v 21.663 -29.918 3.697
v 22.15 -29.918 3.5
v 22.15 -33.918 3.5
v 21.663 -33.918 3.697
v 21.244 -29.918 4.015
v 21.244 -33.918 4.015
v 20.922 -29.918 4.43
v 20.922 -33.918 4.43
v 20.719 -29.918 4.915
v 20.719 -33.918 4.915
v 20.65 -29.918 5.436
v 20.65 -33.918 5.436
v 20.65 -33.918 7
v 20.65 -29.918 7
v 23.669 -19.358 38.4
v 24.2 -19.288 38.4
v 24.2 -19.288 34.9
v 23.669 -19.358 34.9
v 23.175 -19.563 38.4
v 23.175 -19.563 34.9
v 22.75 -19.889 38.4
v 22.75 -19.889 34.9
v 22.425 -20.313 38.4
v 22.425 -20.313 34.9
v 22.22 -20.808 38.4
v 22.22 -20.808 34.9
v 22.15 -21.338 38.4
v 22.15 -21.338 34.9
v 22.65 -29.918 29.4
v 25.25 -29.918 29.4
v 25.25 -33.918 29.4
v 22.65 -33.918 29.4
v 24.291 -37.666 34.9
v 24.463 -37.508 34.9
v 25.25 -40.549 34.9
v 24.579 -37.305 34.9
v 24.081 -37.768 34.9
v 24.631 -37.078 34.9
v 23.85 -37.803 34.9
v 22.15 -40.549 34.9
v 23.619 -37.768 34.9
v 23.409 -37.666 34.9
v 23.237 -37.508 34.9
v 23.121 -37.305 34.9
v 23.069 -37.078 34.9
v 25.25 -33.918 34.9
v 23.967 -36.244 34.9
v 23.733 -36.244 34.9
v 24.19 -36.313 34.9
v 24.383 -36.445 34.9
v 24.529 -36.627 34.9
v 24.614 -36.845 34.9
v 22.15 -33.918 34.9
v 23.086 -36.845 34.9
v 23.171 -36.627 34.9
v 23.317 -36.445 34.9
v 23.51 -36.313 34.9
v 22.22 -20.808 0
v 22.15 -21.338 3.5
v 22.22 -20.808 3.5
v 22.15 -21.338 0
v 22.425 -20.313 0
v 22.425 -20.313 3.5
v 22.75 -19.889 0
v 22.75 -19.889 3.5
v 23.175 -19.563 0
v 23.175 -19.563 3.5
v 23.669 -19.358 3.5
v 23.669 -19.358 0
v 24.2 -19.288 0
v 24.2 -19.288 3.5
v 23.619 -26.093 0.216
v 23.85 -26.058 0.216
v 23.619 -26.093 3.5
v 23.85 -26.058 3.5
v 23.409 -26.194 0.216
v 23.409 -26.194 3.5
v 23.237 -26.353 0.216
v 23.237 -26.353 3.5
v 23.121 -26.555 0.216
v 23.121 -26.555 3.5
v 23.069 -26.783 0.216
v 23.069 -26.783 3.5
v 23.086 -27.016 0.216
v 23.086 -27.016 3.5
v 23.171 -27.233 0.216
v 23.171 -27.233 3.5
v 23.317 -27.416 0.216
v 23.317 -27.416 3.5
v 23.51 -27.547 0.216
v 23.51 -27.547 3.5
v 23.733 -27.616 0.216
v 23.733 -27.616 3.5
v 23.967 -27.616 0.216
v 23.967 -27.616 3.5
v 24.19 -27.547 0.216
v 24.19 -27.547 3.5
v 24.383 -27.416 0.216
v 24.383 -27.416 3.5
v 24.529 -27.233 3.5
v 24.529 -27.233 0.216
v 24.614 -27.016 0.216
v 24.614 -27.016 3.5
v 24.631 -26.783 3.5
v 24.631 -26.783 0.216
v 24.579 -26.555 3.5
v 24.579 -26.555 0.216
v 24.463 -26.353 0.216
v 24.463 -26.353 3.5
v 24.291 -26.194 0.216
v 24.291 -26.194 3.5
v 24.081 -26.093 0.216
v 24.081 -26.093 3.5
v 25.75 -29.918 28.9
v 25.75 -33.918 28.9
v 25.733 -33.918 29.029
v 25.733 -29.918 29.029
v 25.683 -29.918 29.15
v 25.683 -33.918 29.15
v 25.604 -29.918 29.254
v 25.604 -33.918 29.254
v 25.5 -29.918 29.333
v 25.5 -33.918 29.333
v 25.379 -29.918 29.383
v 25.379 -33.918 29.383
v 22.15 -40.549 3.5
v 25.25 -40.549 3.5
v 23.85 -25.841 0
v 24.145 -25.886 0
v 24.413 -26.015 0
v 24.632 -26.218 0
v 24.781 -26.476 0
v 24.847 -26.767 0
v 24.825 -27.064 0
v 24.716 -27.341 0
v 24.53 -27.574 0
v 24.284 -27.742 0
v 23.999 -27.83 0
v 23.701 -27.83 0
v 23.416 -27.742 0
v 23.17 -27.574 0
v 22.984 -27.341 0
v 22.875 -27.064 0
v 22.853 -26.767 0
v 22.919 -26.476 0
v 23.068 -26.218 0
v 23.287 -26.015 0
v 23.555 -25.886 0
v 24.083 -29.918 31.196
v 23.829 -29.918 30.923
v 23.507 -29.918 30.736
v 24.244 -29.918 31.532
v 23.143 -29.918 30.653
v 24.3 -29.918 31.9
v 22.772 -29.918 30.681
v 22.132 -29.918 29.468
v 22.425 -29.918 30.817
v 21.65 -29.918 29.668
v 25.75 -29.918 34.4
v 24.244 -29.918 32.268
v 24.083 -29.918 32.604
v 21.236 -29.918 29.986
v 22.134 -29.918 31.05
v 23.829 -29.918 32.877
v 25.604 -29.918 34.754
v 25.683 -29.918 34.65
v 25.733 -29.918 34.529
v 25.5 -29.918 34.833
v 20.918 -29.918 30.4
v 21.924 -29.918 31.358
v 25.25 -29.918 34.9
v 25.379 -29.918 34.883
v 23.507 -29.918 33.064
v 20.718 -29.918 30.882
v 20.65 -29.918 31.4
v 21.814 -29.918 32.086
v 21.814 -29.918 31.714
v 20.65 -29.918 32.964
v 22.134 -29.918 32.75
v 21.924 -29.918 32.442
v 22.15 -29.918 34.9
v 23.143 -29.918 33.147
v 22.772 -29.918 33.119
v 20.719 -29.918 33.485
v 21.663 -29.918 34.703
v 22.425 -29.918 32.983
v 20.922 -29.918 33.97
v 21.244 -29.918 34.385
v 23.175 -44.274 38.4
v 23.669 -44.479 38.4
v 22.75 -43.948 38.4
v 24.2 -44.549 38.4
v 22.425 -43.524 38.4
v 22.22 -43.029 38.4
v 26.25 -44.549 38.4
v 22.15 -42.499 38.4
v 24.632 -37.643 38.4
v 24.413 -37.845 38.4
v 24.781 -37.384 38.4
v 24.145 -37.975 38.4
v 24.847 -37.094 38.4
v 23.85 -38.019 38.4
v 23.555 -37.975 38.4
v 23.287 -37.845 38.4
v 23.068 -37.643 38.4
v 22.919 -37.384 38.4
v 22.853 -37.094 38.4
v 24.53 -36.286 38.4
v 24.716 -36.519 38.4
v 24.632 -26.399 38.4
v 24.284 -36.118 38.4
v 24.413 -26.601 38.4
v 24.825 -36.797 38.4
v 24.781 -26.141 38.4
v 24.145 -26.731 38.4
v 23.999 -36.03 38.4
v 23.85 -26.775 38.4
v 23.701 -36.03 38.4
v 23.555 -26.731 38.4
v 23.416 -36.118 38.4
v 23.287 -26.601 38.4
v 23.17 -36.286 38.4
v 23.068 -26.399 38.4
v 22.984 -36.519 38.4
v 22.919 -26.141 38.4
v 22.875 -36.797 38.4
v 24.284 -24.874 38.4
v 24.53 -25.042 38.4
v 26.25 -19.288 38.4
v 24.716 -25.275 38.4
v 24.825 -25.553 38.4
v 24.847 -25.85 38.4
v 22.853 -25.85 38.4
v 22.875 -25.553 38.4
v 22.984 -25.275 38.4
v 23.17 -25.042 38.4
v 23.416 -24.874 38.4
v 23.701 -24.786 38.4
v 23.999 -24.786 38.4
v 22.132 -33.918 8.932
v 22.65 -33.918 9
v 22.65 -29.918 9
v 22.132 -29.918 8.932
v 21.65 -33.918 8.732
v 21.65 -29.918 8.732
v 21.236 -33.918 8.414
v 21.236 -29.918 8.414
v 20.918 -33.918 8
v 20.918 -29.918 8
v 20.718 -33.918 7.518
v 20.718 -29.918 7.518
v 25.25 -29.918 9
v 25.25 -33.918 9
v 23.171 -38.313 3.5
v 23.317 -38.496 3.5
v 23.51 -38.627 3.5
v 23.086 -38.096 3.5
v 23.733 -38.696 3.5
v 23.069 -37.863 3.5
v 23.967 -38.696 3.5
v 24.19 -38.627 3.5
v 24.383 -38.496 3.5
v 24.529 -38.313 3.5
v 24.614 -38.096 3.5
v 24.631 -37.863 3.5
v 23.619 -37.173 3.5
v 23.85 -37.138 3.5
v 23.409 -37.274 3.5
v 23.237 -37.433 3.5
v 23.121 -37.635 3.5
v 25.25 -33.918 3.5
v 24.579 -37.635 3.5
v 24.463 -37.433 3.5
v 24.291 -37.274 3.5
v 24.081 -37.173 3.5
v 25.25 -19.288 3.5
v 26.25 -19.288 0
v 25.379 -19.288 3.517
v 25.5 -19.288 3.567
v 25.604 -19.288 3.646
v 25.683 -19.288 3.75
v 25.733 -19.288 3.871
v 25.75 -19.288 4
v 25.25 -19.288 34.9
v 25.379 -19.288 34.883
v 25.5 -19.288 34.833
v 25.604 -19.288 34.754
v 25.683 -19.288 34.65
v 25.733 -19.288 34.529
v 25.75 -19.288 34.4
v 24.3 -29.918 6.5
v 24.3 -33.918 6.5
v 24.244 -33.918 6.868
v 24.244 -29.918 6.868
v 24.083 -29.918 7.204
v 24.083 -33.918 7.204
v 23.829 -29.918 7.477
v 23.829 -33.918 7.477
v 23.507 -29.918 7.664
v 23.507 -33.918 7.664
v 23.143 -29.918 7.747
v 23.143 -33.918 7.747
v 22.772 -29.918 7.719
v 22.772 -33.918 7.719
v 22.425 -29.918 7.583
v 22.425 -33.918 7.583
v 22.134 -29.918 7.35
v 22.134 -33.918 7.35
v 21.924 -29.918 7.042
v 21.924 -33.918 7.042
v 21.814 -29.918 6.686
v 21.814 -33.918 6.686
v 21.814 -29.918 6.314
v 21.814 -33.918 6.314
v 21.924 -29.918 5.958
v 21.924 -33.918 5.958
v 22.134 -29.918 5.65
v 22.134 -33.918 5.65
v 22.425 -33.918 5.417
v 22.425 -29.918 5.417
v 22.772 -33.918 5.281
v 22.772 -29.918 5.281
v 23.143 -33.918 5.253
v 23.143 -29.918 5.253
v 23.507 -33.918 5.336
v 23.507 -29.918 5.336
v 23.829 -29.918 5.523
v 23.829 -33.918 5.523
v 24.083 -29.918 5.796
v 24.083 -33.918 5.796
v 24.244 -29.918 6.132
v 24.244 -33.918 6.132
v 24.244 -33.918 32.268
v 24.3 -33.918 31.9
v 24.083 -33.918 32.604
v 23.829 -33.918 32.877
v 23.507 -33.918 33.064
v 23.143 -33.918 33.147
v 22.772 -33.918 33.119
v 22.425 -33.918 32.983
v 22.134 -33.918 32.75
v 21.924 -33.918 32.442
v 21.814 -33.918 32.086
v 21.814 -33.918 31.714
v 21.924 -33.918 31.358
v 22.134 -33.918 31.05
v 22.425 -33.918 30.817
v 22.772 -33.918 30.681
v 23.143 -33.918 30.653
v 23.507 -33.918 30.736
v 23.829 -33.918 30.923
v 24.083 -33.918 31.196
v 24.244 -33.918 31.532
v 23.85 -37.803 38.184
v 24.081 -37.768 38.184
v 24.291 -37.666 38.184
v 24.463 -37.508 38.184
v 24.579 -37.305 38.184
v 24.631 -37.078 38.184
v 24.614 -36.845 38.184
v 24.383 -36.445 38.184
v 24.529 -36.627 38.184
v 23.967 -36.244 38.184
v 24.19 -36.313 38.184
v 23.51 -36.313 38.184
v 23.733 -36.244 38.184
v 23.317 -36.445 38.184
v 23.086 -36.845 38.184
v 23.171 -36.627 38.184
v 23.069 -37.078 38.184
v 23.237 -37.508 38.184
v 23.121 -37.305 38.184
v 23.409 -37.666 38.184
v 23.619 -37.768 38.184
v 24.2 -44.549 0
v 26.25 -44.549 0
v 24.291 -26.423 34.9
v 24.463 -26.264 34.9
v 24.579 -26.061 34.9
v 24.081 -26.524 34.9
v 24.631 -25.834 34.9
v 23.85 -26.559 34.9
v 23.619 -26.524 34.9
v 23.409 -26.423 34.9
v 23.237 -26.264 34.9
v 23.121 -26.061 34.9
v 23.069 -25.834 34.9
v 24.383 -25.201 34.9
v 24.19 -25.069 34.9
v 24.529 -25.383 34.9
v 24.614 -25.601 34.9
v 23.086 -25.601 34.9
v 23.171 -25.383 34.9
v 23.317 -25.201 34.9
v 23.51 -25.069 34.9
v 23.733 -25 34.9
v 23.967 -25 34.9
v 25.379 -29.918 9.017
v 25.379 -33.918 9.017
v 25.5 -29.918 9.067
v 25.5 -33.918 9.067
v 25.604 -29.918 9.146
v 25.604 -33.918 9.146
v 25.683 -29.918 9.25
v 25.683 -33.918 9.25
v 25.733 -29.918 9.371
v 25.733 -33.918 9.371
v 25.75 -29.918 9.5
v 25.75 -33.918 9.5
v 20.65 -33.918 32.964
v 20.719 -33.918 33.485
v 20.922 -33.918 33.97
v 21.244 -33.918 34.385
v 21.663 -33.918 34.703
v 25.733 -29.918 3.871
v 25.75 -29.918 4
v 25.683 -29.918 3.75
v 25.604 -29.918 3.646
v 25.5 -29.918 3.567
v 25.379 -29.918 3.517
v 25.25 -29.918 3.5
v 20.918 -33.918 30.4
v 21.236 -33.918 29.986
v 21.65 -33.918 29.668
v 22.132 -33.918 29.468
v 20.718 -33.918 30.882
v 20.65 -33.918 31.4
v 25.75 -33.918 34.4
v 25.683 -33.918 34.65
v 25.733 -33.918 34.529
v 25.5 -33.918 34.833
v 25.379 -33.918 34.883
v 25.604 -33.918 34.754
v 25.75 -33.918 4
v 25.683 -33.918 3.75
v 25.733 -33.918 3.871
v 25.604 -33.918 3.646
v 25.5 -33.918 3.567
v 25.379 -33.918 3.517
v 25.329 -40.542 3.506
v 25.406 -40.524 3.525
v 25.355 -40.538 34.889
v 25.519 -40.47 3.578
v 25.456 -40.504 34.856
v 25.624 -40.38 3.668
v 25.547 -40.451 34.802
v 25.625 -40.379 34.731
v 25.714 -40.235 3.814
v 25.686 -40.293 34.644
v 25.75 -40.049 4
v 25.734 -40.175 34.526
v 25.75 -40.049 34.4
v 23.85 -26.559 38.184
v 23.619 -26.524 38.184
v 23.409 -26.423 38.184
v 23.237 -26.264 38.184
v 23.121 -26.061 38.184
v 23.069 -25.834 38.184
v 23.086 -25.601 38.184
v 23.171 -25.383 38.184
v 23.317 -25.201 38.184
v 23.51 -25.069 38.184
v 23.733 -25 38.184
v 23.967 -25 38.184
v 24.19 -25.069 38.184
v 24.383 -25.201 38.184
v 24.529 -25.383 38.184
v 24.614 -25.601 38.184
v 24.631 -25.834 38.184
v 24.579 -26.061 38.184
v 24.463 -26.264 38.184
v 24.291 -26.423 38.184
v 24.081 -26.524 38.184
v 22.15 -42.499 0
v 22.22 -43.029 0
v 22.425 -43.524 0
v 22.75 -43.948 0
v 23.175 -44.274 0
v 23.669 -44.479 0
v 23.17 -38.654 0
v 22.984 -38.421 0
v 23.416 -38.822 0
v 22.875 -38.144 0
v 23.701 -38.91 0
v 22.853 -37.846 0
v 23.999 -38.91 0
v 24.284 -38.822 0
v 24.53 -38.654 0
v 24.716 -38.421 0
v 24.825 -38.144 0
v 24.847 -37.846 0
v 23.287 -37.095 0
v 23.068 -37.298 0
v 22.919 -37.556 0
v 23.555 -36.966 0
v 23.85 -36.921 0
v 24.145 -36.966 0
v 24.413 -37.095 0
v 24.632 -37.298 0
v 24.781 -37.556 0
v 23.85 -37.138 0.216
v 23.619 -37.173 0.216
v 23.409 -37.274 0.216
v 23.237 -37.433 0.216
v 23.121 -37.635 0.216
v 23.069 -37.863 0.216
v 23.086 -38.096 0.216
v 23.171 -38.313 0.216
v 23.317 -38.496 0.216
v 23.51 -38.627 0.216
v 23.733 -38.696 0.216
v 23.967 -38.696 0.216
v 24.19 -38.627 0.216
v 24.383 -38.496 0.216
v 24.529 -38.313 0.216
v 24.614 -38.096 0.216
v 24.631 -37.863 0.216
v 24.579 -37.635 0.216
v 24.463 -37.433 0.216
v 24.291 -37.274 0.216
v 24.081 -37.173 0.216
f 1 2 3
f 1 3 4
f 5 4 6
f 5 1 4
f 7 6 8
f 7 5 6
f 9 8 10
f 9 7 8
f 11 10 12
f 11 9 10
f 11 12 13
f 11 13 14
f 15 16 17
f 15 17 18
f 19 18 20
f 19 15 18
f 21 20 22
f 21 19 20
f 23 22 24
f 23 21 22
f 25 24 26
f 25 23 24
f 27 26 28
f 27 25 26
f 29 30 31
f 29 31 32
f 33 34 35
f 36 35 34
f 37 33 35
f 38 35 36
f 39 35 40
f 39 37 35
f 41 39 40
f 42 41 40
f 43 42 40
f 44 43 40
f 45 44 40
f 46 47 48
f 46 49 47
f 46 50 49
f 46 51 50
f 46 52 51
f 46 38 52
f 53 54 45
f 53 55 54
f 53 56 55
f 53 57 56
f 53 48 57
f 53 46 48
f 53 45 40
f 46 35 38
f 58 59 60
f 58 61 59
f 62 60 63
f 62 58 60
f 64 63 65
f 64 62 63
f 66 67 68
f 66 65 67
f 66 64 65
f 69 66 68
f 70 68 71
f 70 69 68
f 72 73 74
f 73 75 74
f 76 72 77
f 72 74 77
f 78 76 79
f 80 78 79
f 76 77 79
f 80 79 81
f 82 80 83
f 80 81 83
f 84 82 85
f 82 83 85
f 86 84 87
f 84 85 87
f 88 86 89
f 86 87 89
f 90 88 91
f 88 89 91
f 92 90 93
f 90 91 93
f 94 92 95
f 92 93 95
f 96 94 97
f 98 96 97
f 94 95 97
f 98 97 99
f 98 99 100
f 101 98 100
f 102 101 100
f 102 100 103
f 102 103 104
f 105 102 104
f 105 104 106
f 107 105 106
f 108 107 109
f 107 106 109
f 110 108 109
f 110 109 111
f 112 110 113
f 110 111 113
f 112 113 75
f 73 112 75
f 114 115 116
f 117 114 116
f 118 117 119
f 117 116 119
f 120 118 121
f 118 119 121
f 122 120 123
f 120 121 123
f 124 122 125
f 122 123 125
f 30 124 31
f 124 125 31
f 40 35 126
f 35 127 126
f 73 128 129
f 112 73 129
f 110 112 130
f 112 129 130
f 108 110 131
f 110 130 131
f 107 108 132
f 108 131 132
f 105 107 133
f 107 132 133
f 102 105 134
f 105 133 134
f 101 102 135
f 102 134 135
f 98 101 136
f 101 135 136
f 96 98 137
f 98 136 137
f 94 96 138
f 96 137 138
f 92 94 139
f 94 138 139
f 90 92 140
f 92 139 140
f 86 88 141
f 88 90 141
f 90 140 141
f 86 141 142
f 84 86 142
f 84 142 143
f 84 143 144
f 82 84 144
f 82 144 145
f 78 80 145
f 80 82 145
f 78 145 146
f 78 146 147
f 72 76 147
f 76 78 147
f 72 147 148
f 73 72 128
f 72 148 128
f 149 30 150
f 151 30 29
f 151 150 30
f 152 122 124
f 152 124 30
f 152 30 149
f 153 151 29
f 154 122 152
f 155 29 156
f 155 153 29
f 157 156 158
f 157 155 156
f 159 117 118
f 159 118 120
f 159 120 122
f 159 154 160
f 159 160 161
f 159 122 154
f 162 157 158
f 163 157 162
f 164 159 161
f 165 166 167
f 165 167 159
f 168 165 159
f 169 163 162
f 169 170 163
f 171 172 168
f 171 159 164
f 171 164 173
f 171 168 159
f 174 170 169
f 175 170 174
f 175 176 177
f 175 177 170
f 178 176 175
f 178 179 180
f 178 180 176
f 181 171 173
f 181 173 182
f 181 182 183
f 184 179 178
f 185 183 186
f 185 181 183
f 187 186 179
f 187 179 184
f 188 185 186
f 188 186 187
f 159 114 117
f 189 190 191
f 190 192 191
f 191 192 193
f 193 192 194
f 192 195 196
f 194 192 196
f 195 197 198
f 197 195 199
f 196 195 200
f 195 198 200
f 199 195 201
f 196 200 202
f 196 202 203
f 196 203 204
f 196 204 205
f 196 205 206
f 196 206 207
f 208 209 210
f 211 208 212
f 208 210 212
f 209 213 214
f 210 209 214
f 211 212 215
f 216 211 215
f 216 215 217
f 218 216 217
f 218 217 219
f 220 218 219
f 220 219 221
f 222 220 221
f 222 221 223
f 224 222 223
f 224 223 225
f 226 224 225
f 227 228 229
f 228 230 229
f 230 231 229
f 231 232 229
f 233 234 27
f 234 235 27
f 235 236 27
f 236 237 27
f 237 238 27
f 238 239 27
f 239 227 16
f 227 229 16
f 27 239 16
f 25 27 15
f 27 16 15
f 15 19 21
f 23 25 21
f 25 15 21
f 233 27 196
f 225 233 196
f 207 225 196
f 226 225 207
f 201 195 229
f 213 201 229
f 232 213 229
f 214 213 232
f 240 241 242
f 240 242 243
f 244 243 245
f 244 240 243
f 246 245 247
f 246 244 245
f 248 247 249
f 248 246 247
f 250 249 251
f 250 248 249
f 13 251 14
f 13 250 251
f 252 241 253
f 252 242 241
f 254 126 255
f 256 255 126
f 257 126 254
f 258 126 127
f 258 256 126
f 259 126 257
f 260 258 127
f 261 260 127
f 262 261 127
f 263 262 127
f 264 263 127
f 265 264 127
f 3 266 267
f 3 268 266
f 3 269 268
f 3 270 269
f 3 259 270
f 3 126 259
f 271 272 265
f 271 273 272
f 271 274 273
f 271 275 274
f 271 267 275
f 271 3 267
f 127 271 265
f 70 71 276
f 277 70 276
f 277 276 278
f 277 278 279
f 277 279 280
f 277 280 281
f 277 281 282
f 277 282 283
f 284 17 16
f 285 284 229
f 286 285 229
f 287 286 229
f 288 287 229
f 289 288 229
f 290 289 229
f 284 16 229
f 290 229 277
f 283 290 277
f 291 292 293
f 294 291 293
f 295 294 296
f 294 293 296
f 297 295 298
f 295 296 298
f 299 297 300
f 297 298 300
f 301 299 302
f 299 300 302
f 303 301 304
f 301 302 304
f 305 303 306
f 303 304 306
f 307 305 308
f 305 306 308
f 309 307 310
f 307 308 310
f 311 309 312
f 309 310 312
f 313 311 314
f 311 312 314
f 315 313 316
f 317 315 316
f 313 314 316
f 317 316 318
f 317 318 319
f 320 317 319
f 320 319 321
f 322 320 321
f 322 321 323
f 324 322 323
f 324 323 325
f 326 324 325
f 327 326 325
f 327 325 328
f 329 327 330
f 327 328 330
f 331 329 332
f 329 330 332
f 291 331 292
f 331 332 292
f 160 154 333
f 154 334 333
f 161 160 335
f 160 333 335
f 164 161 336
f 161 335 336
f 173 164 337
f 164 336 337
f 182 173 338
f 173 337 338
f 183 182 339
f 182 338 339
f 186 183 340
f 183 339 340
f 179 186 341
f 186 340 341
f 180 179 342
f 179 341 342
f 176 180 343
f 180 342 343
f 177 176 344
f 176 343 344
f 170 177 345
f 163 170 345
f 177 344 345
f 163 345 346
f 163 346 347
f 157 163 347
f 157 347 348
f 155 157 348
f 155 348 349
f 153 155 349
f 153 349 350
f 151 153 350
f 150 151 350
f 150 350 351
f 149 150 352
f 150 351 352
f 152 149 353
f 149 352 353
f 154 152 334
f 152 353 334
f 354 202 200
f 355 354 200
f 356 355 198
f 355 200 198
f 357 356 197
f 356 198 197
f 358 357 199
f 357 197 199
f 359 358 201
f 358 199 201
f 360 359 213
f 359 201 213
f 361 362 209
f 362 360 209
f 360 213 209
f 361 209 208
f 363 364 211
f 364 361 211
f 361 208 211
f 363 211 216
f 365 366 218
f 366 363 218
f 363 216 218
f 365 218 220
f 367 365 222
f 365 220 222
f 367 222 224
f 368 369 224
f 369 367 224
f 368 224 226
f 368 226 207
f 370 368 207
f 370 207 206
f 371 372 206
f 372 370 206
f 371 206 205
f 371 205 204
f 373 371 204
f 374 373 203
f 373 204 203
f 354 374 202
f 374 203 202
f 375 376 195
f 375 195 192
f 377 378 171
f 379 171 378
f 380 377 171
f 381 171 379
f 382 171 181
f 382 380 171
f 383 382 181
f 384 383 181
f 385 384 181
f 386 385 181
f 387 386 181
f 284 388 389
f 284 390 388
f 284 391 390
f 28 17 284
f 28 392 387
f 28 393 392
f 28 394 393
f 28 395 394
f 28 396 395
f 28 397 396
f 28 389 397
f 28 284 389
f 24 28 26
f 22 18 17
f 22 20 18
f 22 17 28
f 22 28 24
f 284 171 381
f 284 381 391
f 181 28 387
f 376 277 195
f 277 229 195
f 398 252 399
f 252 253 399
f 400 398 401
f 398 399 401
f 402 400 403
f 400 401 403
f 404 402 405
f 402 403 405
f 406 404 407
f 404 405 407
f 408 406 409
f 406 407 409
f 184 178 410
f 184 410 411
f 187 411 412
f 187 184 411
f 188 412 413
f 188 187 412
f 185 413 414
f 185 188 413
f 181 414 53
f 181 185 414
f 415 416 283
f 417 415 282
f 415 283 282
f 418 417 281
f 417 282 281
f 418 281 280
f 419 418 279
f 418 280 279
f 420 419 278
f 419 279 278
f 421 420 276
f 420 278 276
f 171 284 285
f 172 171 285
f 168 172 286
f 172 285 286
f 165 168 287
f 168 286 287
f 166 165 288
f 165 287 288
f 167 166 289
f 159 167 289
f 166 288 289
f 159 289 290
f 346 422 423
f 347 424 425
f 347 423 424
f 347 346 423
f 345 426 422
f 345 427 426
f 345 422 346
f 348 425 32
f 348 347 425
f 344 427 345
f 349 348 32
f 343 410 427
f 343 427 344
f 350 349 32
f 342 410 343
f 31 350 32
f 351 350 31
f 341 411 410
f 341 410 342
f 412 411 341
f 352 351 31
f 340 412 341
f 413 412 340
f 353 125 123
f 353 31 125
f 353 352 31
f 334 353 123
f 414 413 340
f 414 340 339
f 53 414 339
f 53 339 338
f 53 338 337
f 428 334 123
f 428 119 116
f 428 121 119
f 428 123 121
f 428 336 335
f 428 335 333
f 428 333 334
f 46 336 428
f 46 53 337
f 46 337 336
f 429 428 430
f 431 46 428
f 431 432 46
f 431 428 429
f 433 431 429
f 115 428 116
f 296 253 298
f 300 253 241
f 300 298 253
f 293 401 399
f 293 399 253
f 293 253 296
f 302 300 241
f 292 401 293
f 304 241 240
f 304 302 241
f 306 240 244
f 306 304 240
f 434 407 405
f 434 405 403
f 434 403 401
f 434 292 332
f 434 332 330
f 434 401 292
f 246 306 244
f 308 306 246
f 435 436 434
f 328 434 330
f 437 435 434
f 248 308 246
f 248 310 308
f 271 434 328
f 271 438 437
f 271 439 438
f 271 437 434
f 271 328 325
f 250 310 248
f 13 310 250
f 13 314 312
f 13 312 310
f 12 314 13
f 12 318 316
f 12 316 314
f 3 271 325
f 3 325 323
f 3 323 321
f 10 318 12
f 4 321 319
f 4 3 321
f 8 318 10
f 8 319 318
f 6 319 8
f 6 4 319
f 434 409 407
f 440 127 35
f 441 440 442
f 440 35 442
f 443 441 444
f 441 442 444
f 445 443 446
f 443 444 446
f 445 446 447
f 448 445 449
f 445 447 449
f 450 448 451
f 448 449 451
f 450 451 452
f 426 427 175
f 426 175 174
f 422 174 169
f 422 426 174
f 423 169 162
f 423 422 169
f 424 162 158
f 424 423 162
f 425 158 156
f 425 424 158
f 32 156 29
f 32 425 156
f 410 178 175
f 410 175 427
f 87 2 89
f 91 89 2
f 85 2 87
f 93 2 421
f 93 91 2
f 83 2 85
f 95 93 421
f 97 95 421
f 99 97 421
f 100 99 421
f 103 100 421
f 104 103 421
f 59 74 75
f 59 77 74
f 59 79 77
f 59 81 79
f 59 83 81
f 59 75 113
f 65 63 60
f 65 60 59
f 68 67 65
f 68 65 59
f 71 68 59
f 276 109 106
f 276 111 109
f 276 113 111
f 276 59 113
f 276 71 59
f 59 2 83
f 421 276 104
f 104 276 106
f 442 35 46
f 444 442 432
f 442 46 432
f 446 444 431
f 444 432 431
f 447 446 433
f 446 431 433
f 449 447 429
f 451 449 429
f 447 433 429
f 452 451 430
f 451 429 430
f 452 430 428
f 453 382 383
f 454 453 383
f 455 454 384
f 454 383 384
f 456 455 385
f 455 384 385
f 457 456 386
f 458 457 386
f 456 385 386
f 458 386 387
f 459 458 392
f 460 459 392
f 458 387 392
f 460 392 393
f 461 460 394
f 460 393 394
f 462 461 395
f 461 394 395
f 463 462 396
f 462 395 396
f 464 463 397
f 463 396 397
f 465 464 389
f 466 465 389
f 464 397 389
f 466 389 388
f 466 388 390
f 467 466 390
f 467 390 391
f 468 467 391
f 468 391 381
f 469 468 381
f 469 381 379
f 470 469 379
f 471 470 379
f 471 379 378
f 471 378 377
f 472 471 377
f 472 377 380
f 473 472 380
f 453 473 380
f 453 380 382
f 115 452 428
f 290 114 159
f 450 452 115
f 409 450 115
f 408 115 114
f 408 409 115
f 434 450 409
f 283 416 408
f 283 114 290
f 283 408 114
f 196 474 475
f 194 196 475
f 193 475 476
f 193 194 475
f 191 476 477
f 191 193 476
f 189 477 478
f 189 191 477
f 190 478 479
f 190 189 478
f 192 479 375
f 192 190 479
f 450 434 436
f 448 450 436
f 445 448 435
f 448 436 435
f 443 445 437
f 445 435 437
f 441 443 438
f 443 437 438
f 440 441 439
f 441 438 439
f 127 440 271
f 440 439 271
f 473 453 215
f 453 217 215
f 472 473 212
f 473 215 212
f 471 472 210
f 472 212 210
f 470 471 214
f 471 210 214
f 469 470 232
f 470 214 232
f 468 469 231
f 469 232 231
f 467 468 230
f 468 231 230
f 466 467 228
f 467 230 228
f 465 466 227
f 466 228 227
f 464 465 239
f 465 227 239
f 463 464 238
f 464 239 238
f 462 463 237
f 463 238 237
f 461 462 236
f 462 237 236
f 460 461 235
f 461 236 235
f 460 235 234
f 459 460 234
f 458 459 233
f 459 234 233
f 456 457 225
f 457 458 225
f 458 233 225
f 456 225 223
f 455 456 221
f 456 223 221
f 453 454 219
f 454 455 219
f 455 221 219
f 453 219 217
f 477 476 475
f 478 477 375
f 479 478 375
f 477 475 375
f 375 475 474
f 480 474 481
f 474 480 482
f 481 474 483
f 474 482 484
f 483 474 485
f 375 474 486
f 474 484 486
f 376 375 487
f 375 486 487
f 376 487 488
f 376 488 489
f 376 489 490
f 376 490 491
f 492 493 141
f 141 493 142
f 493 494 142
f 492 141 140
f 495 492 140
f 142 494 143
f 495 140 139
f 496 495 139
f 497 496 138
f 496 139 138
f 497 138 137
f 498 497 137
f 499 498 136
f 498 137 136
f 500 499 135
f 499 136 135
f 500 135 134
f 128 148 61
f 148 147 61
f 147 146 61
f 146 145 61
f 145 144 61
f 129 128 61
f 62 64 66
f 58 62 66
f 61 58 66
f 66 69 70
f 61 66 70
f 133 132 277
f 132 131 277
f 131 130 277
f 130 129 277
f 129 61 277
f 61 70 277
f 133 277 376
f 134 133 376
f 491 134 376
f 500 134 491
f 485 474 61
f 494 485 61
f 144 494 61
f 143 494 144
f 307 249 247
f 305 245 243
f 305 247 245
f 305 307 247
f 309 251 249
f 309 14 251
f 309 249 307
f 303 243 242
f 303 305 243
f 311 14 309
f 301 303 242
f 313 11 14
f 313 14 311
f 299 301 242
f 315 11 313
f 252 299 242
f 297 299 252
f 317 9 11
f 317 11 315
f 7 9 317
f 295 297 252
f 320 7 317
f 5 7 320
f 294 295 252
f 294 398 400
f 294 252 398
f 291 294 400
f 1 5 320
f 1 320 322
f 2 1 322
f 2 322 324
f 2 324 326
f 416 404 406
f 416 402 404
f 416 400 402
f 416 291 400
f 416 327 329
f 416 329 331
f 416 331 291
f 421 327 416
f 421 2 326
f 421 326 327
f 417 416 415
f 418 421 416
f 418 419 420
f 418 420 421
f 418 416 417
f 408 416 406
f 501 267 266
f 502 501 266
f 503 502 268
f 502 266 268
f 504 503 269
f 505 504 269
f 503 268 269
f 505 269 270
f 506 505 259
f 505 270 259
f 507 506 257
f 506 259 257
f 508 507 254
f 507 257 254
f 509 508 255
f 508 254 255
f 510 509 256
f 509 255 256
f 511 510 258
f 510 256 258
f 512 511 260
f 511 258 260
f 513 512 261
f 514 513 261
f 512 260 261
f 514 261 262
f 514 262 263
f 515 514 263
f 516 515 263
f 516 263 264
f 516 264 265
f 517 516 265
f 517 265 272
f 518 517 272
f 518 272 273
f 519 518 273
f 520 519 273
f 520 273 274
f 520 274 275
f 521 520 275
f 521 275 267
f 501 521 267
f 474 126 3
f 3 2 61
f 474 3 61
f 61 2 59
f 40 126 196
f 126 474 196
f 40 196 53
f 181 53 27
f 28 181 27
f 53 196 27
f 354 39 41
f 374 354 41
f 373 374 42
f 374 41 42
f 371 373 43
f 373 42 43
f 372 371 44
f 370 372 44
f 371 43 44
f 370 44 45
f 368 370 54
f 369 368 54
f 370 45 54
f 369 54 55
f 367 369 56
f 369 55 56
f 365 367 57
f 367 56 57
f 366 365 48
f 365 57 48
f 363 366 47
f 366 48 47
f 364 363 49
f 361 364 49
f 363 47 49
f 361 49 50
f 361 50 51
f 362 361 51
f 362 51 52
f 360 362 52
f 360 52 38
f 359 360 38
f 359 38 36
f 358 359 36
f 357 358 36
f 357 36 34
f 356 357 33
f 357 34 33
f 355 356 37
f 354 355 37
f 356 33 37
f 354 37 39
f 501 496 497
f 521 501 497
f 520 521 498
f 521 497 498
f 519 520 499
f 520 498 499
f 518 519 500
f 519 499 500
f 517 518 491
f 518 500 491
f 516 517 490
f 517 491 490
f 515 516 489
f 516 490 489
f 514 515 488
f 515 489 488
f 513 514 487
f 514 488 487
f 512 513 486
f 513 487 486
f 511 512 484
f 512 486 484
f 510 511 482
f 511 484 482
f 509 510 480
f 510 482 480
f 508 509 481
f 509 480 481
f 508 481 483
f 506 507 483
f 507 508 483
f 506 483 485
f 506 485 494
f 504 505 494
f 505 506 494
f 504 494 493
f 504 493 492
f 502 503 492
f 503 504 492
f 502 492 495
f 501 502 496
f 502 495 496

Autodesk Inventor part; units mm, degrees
ref_plane "YZ Plane" through (0, 0, 0) normal (1, 0, 0) x (0, 1, 0)
ref_plane "XZ Plane" through (0, 0, 0) normal (0, 1, 0) x (-1, 0, 0)
ref_plane "XY Plane" through (0, 0, 0) normal (0, 0, 1) x (1, 0, 0)
ref_plane "Work Plane1" through (0, 0, 0) normal (0, 0, 1) x (1, 0, 0)
sketch "Sketch1" plane through (0, 0, 0) normal (0, 0, 1) x (1, 0, 0)
  circle A0 centre (23.85, -37.9212) radius 0.7 projected
  circle A1 centre (23.85, -26.8413) radius 0.7 projected
  circle A2 centre (10.55, -52.3871) radius 14 projected
  circle A3 centre (10.55, -11.45) radius 14 projected
  line L0 (25.25, -34.8579) -> (25.25, -62.5871) projected
  line L1 (22.15, -44.5487) -> (26.25, -44.5487)
  line L2 (26.25, -44.5487) -> (26.25, -19.2884)
  line L3 (26.25, -19.2884) -> (22.15, -19.2884)
  line L4 (22.15, -19.2884) -> (22.15, -44.5487)
  circle A4 centre (24.2, -42.4987) radius 2.05
  circle A5 centre (24.2, -21.3384) radius 2.05
  point P0 (0, 0)
  point P1 (24.2, -19.2884)
  point P2 (22.15, -21.3384)
  point P3 (22.15, -42.4987)
  point P4 (24.2, -44.5487)
  dimension "d0" = 1
  dimension "d1" = 1
extrude "Extrusion1" add sketch "Sketch1" along normal blind 3.5 contours A0 | A1 | A4 L0 L1 | A4 L0 | L4 A5 L2 A4 | L0 A4 L2 L1 | L0 A4 | A5 | L3 L2 A5
sketch "Sketch2" plane through (0, 0, 3.5) normal (0, 0, 1) x (1, 0, 0)
  line L0 (22.25, -33.4185) -> (19.55, -33.4185) projected
  line L1 (22.25, -30.4185) -> (19.55, -30.4185) projected
  line L2 (26.25, -33.9066) -> (26.25, -41.9871) projected
  line L3 (26.25, -29.1685) -> (26.25, -34.6685) projected
  line L4 (26.25, -21.85) -> (26.25, -29.9304) projected
  line L5 (22.15, -21.3384) -> (22.15, -42.4987) projected
  line L6 (26.25, -33.9185) -> (20.65, -33.9185)
  line L7 (20.65, -33.9185) -> (20.65, -29.9185)
  line L8 (20.65, -29.9185) -> (26.25, -29.9185)
  line L9 (26.25, -29.9185) -> (26.25, -33.9185)
  point P0 (0, 0)
  dimension "d4" = 0.5
  dimension "d5" = 0.5
  dimension "d6" = 1.5
extrude "Extrusion2" add sketch "Sketch2" along normal blind 5.5
sketch "Sketch3" plane through (20.65, -33.9185, 3.5) normal (0, -1, 0) x (1, 0, 0)
  circle A0 centre (-2.1, 3) radius 1.25 projected
  line L0 (5.6, 0) -> (5.6, 5.5) projected
  circle A1 centre (2.4, 3) radius 1.25
  line L1 (2.4, 3) -> (-2.1, 3)
  circle A2 centre (2.4, 3) radius 2.5
  point P0 (-20.65, -3.5)
  dimension "d17" = 5
  dimension "d18" = 0.7
extrude "Extrusion3" cut sketch "Sketch3" against normal blind 11.5 contours A1
fillet "Fillet1" radius 2 2 edges at (20.65, -31.9185, 9) (20.65, -31.9185, 3.5)
ref_plane "Work Plane2" through (0, 0, 19.2) normal (0, 0, 1) x (1, 0, 0)
mirror "Mirror1" about plane through (0, 0, 19.2) normal (0, 0, 1) of "Extrusion1", "Extrusion2", "Extrusion3", "Fillet1"
sketch "Sketch4" plane through (0, 0, 3.5) normal (0, 0, 1) x (1, 0, 0)
  line L0 (26.25, -44.5487) -> (26.25, -19.2884) projected
  line L1 (24.2, -44.5487) -> (26.25, -44.5487) projected
  line L2 (26.25, -19.2884) -> (24.2, -19.2884) projected
  line L3 (25.75, -44.5487) -> (25.75, -19.2884)
  arc A0 (22.15, -42.4987) -> (24.2, -44.5487) centre (24.2, -42.4987) ccw projected
  line L4 (22.15, -21.3384) -> (22.15, -42.4987) projected
  arc A1 (24.2, -19.2884) -> (22.15, -21.3384) centre (24.2, -21.3384) ccw projected
  line L5 (25.75, -40.5487) -> (22.15, -40.5487)
  point P0 (0, 0)
  dimension "d14" = 0.5
  dimension "d20" = 4
extrude "Extrusion4" add sketch "Sketch4" along normal up to surface (31.4 mm away) contours L1 L3 L2 L0 | L1 A0 L4 L5 L3
fillet "Fillet2" radius 0.5 7 edges at (25.75, -37.2336, 3.5) (25.75, -24.6035, 3.5) (25.75, -37.2336, 34.9) (25.75, -24.6035, 34.9) (25.75, -40.5487, 19.2) (25.75, -31.9185, 9) (25.75, -31.9185, 29.4)
sketch "Sketch5" plane through (24.2, -19.2884, 38.4) normal (0, 0, 1) x (1, 0, 0)
  circle A0 centre (-0.35, -17.7307) radius 0.7 projected
  circle A1 centre (-0.35, -6.4868) radius 0.7 projected
  point P0 (-24.2, 19.2884)
hole "Hole1" at (23.85, -37.0191, 38.4) at (23.85, -25.7752, 38.4) direction (0, 0, -1) diameter 1.567 depth 6.3 countersink diameter 2 countersink angle 90 thread size "M2x0.4" class "6H" standard "ISO Metric profile"
sketch "Sketch6" plane through (0, 0, 0) normal (0, 0, -1) x (-1, 0, 0)
  circle A0 centre (-23.85, -26.8413) radius 0.7 projected
  circle A1 centre (-23.85, -37.9212) radius 0.7 projected
  point P0 (0, 0)
hole "Hole2" at (23.85, -26.8413, 0) at (23.85, -37.9212, 0) direction (0, 0, 1) diameter 1.567 depth 6.3 countersink diameter 2 countersink angle 90 thread size "M2x0.4" class "6H" standard "ISO Metric profile"
equation "\"d5\" = d4"
properties part number "DriverDownholdAlternate"
